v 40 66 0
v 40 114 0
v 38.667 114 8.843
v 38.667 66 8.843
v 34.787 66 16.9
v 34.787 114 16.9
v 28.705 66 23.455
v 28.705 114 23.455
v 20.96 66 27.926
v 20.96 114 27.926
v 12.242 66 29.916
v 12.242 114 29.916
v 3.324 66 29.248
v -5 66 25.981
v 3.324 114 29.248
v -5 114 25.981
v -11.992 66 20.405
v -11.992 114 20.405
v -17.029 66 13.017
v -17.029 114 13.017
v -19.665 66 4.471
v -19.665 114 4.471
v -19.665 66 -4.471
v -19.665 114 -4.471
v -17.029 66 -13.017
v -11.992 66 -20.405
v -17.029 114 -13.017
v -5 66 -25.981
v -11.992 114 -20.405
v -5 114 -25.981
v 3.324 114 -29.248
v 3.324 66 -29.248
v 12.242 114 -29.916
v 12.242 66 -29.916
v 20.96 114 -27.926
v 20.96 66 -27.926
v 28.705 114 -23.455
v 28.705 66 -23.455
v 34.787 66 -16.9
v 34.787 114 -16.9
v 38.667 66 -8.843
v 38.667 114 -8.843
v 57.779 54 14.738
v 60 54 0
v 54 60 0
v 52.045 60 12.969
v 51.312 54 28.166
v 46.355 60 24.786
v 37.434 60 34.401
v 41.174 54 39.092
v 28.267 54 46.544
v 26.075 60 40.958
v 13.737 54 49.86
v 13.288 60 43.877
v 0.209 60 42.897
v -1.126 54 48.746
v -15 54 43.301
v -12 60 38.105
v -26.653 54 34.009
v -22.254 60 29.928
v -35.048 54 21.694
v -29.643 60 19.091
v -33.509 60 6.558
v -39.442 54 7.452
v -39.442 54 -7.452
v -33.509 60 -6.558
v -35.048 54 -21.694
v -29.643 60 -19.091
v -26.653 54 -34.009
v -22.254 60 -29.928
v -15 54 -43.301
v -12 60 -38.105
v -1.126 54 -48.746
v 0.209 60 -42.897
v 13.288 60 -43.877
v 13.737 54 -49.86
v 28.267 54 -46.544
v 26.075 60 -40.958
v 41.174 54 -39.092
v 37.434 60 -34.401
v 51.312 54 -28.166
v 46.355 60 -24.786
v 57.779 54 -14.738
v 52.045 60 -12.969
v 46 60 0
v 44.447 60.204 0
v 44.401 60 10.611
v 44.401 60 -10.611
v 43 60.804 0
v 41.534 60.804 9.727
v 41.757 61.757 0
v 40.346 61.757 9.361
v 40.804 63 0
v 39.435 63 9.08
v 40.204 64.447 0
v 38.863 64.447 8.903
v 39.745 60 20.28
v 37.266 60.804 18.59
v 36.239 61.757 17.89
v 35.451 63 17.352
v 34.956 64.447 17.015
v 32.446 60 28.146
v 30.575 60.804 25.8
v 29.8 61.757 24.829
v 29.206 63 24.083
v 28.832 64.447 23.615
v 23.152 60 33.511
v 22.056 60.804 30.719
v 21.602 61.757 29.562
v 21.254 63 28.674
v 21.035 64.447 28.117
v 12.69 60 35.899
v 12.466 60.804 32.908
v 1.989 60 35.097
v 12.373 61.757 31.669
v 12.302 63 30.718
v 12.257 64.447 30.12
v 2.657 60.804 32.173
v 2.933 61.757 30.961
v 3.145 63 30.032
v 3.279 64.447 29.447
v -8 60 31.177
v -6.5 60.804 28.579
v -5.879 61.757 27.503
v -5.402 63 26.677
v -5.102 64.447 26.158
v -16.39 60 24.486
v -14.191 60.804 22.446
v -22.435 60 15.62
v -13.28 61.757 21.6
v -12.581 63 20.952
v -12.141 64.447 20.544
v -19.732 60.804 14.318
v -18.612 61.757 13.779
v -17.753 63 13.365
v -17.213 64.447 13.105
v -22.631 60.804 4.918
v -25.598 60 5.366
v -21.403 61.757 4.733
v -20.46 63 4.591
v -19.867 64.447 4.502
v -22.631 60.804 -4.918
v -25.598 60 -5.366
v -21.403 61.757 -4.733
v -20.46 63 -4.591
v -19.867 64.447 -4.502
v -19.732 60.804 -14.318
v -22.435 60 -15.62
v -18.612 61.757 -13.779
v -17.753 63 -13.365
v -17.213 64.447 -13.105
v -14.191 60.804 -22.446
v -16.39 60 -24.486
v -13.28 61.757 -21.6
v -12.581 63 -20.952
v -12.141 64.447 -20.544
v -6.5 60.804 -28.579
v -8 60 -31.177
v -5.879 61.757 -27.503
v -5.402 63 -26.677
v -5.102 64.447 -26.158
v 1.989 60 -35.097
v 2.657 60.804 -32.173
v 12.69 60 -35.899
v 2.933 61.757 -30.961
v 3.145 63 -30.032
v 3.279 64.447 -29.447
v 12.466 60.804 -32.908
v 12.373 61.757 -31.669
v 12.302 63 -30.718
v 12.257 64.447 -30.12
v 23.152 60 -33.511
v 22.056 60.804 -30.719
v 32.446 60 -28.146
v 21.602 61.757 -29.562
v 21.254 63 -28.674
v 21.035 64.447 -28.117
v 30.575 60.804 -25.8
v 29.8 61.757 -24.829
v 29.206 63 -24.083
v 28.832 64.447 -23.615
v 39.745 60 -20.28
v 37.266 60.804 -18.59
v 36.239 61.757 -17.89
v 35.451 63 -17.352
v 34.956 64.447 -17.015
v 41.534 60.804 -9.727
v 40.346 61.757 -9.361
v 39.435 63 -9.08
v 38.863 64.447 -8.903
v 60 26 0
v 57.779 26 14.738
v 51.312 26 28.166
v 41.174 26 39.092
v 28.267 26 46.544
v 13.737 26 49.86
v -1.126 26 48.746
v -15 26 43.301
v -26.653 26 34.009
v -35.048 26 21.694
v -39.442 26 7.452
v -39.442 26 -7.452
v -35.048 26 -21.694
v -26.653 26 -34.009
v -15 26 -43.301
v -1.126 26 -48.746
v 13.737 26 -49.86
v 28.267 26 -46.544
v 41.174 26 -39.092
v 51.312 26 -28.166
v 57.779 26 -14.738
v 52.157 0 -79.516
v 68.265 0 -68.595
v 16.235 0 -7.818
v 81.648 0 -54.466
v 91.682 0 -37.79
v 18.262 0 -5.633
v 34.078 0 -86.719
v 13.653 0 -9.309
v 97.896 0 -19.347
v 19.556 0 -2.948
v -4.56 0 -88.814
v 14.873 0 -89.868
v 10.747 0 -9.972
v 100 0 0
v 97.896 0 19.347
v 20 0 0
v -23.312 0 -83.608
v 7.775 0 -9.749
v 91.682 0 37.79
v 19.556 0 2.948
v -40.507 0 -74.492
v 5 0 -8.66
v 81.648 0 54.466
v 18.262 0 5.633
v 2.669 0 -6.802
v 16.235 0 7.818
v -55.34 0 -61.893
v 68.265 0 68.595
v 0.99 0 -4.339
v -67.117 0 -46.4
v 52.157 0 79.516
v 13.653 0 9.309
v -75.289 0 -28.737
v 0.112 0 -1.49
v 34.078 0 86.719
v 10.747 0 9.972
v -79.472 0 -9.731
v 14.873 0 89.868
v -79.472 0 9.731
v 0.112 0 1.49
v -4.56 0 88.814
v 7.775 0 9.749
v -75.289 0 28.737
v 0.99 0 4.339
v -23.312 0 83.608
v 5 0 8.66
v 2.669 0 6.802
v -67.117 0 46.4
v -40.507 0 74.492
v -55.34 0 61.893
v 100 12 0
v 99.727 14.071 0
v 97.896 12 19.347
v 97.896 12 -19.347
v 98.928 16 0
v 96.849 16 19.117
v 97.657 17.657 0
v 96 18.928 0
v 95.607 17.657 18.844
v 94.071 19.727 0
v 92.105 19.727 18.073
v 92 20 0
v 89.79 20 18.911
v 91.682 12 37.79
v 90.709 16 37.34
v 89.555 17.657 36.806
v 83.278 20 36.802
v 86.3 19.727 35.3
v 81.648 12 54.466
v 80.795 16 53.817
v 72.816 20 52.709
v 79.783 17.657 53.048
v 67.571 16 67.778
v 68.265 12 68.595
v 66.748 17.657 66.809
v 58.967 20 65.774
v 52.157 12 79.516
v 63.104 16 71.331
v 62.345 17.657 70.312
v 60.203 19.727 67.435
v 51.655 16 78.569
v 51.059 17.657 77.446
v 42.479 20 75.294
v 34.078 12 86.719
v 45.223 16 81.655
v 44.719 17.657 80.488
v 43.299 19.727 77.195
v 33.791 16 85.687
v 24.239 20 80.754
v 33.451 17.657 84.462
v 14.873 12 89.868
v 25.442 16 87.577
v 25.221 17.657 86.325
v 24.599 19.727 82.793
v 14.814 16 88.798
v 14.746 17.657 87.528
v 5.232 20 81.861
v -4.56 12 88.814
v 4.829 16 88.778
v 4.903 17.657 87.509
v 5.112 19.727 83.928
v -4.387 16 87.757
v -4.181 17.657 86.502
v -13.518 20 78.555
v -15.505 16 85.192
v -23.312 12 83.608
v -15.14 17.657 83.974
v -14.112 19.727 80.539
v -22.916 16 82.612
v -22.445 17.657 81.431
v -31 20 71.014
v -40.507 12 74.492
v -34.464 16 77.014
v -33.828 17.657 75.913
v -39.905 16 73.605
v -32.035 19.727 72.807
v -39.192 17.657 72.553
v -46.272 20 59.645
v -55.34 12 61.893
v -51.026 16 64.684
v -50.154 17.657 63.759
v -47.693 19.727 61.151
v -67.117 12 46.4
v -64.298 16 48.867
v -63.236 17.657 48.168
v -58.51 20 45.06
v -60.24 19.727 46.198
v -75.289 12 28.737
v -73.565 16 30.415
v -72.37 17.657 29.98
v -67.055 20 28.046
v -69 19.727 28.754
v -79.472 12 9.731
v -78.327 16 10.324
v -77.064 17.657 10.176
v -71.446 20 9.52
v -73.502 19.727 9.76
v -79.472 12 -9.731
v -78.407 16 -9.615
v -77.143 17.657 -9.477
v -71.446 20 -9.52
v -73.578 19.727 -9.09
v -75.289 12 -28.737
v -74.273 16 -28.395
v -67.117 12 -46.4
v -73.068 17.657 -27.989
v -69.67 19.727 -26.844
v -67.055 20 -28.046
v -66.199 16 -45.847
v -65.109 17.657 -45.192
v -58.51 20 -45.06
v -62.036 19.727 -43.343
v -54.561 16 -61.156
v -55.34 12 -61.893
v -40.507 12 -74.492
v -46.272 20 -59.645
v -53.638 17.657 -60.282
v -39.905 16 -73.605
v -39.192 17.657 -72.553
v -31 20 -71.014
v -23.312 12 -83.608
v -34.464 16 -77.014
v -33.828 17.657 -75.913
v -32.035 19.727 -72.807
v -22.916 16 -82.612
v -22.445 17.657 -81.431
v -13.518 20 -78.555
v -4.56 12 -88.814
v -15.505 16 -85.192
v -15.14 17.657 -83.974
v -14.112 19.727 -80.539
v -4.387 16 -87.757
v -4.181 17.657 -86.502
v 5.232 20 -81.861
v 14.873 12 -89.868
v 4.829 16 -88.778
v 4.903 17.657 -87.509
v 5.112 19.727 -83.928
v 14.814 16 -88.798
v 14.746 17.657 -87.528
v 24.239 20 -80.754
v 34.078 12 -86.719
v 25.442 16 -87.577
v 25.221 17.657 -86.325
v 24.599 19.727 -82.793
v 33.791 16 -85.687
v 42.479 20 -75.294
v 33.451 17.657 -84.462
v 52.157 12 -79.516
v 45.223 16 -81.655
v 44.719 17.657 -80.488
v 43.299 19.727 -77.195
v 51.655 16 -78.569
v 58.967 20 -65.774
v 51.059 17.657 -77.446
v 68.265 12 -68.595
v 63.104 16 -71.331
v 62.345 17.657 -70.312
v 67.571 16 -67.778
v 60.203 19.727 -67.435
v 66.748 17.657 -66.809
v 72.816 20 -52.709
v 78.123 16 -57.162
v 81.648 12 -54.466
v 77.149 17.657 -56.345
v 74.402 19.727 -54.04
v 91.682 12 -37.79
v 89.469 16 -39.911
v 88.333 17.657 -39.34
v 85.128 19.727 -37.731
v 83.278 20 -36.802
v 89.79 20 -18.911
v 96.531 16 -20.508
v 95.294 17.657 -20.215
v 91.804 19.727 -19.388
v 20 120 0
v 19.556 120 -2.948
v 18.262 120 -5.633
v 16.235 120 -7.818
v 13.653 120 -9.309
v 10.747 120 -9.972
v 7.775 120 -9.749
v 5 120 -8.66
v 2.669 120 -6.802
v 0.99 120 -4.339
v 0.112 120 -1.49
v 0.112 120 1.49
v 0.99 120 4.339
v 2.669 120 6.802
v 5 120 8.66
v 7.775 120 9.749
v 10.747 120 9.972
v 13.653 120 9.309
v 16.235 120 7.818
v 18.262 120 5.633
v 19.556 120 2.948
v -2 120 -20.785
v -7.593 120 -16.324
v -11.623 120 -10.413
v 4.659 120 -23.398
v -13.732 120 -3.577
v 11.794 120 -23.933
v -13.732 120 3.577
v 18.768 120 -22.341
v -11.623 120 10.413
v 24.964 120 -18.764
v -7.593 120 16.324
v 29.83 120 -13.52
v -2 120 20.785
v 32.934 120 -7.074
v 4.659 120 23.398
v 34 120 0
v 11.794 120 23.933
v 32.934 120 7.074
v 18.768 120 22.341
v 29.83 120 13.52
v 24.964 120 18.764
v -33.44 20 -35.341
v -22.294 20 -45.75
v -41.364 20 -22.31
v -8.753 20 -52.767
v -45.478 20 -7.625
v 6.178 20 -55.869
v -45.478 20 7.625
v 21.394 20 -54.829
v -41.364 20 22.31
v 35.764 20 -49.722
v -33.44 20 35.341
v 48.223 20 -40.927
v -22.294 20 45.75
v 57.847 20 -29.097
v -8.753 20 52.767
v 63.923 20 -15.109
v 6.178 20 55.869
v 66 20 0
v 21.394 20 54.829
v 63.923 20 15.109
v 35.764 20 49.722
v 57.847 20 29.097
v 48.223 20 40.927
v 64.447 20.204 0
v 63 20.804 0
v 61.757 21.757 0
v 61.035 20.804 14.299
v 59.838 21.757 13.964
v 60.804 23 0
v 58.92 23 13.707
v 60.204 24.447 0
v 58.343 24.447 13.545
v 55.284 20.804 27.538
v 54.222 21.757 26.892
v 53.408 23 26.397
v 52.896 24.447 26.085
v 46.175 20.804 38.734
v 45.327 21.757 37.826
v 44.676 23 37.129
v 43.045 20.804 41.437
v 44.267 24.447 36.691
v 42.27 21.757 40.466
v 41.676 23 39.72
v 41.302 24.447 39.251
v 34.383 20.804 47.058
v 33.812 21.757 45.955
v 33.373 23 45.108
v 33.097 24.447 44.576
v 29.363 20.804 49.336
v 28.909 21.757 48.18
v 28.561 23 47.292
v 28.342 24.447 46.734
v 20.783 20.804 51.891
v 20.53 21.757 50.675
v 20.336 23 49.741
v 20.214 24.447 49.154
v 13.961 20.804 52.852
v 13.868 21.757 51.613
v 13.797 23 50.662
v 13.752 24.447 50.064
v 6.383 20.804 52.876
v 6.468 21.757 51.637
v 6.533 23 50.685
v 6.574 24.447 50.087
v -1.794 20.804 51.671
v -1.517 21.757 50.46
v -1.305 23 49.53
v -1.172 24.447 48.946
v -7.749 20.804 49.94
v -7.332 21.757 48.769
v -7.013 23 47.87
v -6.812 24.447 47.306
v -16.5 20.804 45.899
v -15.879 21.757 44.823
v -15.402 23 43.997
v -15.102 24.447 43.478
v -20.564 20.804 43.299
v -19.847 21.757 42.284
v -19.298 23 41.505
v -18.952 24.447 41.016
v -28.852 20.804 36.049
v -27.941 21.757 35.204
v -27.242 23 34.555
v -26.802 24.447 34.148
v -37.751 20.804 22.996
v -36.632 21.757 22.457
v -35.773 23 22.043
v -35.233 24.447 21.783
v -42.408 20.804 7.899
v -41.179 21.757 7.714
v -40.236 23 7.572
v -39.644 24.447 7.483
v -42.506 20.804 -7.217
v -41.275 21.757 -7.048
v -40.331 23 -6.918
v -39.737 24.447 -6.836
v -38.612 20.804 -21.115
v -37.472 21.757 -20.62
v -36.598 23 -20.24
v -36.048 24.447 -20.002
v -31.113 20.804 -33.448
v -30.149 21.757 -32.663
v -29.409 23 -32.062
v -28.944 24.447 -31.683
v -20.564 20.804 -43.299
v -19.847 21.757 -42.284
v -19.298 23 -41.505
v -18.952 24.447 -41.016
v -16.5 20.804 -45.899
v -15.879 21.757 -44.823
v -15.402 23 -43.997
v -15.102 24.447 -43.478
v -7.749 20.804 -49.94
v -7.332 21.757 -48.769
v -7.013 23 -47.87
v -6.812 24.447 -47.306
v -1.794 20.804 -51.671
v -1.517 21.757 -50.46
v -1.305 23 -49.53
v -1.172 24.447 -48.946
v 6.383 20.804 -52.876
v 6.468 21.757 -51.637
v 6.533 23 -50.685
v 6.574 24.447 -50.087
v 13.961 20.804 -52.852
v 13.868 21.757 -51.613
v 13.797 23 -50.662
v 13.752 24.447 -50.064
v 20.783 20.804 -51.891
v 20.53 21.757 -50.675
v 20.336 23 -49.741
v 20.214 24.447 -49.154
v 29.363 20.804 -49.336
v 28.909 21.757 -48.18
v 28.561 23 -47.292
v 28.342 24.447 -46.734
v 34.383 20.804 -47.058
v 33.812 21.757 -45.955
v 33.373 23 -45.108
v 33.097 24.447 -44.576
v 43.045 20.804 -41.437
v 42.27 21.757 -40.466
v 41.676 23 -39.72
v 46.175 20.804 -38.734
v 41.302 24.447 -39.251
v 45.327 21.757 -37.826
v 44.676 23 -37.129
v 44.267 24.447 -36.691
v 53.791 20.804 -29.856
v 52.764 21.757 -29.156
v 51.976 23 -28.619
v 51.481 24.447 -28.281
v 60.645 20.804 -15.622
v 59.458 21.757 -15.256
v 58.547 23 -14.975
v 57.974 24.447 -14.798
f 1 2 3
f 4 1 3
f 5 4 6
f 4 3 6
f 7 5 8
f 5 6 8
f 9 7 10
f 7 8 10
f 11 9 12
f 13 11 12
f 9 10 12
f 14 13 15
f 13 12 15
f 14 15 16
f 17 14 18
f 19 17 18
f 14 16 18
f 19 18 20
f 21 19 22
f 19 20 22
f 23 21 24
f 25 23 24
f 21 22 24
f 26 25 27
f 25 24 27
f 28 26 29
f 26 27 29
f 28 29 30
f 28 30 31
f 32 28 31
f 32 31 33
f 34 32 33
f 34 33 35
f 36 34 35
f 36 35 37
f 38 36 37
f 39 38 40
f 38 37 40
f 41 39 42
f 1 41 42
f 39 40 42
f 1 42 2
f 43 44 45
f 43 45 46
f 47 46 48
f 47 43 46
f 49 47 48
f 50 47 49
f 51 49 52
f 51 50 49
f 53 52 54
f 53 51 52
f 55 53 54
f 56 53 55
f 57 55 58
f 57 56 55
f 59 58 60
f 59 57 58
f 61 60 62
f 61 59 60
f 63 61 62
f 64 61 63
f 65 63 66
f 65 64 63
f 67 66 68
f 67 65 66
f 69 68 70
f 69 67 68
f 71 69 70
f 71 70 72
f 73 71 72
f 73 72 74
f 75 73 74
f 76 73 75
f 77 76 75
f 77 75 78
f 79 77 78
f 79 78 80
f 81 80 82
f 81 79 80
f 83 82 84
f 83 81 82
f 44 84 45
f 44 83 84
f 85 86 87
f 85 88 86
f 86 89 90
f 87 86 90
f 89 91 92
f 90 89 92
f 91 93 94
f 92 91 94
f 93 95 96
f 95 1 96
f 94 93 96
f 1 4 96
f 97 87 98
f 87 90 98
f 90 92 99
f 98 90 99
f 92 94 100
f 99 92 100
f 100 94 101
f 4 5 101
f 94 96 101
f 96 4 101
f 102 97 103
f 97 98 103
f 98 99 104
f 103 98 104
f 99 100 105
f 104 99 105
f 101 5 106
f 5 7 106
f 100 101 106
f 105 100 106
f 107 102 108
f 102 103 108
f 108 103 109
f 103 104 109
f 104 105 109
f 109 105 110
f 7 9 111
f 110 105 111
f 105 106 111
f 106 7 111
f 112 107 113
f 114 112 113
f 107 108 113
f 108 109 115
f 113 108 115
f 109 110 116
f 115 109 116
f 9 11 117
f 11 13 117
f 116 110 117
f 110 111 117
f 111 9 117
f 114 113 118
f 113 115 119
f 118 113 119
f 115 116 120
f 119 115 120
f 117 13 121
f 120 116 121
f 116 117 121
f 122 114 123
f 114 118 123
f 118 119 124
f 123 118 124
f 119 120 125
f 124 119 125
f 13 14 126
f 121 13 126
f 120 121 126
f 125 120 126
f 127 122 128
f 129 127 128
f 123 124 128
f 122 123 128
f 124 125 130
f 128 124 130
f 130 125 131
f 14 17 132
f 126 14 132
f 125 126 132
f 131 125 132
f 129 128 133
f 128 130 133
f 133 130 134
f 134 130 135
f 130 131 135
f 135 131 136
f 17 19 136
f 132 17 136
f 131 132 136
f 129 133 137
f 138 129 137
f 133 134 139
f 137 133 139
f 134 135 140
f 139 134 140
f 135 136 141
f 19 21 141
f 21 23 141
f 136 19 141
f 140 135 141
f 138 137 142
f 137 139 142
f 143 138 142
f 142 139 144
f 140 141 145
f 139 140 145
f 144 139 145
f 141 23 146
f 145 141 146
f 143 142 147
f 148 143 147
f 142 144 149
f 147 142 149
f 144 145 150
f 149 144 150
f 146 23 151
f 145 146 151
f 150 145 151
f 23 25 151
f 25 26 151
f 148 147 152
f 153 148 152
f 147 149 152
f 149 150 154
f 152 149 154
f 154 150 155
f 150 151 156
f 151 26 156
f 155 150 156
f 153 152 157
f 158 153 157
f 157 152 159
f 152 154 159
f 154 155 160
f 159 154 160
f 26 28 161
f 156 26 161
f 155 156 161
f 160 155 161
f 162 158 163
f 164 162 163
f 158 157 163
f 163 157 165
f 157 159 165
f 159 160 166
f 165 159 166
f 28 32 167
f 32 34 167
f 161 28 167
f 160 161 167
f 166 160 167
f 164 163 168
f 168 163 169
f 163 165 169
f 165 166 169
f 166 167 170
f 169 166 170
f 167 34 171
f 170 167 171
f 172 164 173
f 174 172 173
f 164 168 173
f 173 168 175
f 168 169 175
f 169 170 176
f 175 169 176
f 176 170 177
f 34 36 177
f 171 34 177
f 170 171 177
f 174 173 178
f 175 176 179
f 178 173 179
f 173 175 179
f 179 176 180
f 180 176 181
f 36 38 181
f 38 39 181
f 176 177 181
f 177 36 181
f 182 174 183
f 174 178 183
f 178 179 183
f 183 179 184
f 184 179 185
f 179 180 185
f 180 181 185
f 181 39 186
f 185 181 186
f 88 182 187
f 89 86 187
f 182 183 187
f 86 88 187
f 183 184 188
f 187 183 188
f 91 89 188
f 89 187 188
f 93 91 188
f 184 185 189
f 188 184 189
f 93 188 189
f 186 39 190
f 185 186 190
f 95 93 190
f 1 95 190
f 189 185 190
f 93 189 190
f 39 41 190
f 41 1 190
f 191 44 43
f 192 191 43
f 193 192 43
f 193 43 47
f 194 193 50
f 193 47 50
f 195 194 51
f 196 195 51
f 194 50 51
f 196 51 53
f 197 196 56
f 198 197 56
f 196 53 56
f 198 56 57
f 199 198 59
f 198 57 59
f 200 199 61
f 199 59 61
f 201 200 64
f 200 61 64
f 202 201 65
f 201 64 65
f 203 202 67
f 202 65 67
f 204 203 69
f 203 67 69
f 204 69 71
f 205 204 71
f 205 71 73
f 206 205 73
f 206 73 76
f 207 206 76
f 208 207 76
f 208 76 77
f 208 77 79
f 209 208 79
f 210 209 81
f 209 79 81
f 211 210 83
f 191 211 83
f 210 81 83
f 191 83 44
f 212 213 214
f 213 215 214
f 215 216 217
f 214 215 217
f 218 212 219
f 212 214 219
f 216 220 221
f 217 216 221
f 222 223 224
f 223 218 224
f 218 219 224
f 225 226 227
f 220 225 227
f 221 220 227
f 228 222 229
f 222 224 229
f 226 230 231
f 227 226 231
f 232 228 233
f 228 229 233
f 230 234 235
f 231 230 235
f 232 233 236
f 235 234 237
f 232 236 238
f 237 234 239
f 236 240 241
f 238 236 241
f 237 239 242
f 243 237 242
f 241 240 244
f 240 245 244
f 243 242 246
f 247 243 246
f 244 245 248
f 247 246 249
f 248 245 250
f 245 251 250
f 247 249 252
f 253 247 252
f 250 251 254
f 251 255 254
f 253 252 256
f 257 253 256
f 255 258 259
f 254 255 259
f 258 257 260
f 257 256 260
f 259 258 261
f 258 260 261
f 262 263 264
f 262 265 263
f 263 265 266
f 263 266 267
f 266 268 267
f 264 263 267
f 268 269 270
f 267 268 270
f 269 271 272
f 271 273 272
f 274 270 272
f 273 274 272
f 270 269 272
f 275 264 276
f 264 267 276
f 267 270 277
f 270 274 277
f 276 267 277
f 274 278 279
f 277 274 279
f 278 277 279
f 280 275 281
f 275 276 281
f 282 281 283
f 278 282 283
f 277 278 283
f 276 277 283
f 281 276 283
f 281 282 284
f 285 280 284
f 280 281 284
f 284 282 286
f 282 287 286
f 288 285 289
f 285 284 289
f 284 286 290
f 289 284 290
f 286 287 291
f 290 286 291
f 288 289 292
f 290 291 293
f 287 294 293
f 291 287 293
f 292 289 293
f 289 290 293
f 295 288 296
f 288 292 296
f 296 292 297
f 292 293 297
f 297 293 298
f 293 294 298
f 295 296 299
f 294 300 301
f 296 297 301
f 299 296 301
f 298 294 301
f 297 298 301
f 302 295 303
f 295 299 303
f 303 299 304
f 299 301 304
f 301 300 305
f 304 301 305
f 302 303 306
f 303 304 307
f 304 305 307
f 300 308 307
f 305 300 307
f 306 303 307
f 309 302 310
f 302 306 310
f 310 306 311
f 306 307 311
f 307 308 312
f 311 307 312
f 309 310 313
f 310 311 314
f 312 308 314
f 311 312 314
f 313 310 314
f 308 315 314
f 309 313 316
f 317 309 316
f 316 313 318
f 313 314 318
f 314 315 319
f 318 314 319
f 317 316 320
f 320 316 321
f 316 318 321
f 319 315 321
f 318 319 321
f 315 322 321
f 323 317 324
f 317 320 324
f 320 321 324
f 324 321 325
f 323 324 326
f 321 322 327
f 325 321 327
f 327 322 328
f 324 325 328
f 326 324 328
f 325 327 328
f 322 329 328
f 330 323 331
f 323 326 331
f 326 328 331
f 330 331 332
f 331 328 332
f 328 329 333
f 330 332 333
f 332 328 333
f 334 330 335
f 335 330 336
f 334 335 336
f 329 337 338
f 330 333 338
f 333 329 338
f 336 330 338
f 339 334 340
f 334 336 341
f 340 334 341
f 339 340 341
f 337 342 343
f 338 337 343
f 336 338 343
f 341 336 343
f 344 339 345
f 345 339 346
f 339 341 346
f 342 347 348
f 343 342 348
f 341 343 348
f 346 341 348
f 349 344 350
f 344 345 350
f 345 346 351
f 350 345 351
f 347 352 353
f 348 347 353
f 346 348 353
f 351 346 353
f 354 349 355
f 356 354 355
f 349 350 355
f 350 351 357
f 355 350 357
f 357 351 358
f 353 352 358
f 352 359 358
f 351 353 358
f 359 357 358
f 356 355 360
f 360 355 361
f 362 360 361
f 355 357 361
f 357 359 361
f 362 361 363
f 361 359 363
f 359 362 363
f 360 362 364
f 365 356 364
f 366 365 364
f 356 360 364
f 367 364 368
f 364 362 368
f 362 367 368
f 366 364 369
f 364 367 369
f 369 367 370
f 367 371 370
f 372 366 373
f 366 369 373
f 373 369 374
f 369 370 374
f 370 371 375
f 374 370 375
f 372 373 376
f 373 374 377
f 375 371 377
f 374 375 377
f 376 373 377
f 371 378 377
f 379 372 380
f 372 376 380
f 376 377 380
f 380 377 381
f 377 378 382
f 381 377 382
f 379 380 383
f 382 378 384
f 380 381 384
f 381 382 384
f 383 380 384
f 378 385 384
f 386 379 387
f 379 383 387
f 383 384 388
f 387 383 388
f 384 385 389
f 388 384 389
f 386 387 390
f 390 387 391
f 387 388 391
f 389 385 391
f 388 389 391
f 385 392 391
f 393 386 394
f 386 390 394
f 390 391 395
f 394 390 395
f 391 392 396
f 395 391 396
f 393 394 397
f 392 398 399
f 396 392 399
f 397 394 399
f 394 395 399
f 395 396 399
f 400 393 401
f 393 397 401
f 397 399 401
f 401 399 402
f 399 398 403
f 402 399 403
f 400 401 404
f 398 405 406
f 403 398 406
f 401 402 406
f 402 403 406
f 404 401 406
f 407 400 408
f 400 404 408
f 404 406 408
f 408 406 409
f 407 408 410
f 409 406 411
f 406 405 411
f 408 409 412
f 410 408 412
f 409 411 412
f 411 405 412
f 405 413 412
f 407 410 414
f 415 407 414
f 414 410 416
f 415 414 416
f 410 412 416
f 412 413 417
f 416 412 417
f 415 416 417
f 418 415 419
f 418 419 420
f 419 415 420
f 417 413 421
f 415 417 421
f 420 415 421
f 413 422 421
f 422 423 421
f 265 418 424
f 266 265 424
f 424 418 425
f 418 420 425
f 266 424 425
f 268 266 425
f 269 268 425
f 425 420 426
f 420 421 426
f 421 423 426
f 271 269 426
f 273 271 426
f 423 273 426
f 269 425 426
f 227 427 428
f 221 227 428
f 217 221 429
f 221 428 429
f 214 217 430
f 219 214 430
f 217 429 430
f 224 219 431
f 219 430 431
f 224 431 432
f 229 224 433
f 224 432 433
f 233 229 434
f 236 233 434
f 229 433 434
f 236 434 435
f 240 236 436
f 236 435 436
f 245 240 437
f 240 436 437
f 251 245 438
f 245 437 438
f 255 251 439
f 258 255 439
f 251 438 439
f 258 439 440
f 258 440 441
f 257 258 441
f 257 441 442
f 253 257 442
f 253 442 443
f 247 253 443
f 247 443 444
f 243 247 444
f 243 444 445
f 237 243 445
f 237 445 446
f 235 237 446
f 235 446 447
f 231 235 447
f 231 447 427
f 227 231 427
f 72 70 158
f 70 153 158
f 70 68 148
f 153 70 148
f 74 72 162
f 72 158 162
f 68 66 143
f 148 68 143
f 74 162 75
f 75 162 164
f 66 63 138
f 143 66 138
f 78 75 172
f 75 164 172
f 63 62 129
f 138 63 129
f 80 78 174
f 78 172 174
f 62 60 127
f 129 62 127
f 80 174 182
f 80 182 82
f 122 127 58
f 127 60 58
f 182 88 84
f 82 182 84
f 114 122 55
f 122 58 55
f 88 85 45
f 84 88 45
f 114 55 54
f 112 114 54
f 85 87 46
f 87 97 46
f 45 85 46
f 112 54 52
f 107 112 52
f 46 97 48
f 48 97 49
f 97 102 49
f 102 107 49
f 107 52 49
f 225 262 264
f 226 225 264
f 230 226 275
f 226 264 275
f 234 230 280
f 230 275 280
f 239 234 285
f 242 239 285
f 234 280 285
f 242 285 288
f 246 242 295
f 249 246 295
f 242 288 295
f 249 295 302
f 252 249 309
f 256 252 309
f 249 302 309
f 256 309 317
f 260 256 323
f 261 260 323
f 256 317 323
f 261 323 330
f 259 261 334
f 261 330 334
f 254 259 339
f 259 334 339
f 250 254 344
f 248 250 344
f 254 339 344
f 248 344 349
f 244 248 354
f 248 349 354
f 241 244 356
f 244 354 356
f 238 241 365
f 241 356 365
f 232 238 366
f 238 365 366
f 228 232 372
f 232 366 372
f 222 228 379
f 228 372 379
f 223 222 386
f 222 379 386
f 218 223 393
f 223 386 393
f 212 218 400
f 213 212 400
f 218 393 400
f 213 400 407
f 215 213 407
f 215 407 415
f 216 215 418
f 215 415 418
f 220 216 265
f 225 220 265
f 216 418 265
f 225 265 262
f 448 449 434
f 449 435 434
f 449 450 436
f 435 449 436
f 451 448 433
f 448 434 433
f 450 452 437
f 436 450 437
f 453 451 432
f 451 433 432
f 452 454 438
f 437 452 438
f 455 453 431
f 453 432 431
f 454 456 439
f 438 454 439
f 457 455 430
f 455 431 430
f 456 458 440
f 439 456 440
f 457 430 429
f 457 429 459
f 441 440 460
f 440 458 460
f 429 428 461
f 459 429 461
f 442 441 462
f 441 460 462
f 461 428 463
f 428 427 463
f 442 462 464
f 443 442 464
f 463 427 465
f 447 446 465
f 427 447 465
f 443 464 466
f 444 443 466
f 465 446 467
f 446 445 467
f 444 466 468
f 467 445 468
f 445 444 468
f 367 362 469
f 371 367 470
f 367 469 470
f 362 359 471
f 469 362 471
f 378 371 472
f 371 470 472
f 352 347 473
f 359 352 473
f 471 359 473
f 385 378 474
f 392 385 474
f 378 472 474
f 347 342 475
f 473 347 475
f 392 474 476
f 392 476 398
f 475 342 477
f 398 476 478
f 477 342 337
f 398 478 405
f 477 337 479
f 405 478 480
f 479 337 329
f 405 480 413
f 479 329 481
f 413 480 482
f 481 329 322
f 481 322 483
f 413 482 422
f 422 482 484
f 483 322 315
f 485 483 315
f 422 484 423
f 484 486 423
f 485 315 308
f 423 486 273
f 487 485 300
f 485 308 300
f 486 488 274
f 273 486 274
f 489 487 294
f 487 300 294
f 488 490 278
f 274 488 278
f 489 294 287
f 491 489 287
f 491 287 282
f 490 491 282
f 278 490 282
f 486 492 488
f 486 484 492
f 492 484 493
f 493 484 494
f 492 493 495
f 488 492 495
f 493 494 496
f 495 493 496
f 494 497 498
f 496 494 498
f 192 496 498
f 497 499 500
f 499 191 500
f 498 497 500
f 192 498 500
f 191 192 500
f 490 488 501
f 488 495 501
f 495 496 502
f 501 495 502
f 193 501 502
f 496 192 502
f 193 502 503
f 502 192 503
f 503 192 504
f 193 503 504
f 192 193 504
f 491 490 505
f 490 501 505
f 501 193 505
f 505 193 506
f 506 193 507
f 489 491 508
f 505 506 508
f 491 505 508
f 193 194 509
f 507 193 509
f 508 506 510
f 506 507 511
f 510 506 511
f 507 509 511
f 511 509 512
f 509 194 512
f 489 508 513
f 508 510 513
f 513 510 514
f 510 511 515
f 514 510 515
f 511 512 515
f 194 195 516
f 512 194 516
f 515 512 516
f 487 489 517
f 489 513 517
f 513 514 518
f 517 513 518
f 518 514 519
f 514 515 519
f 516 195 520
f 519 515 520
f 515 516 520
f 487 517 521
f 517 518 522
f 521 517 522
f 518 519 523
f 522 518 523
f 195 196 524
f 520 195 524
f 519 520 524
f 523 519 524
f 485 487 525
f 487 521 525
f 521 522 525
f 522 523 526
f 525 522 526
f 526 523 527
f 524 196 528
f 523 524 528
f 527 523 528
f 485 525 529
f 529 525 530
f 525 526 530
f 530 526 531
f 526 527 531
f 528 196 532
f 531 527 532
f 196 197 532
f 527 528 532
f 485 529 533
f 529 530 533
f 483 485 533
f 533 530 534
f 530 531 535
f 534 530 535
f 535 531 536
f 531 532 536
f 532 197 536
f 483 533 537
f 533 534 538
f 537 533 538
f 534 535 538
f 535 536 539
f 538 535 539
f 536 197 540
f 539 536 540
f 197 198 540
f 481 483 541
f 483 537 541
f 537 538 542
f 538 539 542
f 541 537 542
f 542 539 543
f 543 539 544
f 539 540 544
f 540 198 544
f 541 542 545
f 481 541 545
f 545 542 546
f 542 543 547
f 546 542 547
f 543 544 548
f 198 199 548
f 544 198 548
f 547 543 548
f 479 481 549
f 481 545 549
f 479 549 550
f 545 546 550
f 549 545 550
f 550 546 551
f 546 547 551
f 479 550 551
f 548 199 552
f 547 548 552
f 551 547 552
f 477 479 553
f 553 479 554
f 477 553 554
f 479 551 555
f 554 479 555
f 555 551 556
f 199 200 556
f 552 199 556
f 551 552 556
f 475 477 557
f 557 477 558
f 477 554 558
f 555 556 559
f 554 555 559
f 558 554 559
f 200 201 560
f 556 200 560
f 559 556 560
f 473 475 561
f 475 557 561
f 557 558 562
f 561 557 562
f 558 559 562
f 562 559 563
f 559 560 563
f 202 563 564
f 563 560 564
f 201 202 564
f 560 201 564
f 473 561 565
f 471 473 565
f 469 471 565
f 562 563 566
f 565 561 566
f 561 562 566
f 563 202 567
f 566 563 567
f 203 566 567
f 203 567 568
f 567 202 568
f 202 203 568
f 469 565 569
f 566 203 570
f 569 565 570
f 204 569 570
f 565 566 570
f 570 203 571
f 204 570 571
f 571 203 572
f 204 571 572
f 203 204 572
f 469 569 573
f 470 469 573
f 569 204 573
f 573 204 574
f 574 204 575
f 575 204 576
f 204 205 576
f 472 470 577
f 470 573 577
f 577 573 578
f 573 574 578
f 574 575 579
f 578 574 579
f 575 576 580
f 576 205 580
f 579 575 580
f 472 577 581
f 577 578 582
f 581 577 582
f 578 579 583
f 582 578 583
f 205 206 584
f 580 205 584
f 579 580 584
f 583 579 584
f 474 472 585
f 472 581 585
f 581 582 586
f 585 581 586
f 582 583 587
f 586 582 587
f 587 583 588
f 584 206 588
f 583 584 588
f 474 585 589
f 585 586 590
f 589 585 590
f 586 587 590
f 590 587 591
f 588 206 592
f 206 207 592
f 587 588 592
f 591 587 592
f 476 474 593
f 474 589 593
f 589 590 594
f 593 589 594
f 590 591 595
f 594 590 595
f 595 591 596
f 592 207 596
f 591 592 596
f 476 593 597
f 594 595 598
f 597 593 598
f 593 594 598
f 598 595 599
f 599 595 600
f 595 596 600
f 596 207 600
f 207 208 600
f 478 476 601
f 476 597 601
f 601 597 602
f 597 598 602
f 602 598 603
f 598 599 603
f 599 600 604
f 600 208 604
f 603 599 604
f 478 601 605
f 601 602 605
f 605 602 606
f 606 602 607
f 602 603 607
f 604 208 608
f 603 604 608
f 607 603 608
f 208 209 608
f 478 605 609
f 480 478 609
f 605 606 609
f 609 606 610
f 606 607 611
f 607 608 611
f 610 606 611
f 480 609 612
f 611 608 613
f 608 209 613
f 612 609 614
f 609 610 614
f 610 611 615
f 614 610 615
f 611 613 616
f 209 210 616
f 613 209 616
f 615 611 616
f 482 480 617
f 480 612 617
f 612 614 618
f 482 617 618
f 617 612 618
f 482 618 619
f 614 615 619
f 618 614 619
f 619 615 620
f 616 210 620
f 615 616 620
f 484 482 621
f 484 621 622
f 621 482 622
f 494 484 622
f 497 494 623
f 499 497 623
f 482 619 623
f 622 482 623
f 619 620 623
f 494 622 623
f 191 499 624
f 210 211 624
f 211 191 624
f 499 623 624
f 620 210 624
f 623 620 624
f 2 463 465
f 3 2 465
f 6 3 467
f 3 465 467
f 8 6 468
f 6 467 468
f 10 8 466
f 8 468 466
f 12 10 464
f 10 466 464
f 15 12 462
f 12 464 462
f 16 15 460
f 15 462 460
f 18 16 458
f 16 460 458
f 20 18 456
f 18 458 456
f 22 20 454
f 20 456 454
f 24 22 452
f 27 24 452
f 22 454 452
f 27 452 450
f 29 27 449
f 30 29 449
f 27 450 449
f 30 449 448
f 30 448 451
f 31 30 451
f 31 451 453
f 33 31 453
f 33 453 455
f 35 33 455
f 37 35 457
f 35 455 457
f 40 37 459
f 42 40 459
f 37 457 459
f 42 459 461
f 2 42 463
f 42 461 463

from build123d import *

# Parameters (mm, degrees)
FILLET2_R               = 8
FILLET3_R               = 6
FILLET4_R               = 6
SKETCH3_R               = 10
CUT_EXTRUDE2_DEPTH      = 10
CUT_EXTRUDE2_DEPTH_BACK = 121
CHAMFER2_SIZE           = 6


with BuildPart() as part:
    # Sketch2 → Revolve1 (revolve)
    with BuildSketch(Plane.XY):
        Polygon((10, 120), (10, 0), (100, 0), (100, 20), (60, 20), (60, 60), (40, 60), (40, 120), align=None)
    revolve(axis=Axis((10, 120, 0), (0, -1, 0)))

    # Fillet2
    fillet2_edges = [part.edges().sort_by_distance(p)[0] for p in [
        (-80, 20, 0),
    ]]
    fillet(fillet2_edges, radius=FILLET2_R)

    # Fillet3
    fillet3_edges = [part.edges().sort_by_distance(p)[0] for p in [
        (-40, 20, 0),
    ]]
    fillet(fillet3_edges, radius=FILLET3_R)

    # Fillet4
    fillet4_edges = [part.edges().sort_by_distance(p)[0] for p in [
        (-20, 60, 0),
    ]]
    fillet(fillet4_edges, radius=FILLET4_R)

    # Sketch3 → Cut-Extrude2 (cut, two sides)
    with BuildSketch(Plane(origin=(0, 120, 0), x_dir=(1, 0, 0), z_dir=(0, 1, 0))) as cut_extrude2_sk:
        with Locations((10, 0)):
            Circle(SKETCH3_R)
    extrude(amount=CUT_EXTRUDE2_DEPTH, mode=Mode.SUBTRACT)
    extrude(cut_extrude2_sk.sketch, amount=-CUT_EXTRUDE2_DEPTH_BACK, mode=Mode.SUBTRACT)

    # Chamfer2
    chamfer2_edges = [part.edges().sort_by_distance(p)[0] for p in [
        (-20, 120, 0),
        (-40, 60, 0),
    ]]
    chamfer(chamfer2_edges, length=CHAMFER2_SIZE)


solid = part.part
